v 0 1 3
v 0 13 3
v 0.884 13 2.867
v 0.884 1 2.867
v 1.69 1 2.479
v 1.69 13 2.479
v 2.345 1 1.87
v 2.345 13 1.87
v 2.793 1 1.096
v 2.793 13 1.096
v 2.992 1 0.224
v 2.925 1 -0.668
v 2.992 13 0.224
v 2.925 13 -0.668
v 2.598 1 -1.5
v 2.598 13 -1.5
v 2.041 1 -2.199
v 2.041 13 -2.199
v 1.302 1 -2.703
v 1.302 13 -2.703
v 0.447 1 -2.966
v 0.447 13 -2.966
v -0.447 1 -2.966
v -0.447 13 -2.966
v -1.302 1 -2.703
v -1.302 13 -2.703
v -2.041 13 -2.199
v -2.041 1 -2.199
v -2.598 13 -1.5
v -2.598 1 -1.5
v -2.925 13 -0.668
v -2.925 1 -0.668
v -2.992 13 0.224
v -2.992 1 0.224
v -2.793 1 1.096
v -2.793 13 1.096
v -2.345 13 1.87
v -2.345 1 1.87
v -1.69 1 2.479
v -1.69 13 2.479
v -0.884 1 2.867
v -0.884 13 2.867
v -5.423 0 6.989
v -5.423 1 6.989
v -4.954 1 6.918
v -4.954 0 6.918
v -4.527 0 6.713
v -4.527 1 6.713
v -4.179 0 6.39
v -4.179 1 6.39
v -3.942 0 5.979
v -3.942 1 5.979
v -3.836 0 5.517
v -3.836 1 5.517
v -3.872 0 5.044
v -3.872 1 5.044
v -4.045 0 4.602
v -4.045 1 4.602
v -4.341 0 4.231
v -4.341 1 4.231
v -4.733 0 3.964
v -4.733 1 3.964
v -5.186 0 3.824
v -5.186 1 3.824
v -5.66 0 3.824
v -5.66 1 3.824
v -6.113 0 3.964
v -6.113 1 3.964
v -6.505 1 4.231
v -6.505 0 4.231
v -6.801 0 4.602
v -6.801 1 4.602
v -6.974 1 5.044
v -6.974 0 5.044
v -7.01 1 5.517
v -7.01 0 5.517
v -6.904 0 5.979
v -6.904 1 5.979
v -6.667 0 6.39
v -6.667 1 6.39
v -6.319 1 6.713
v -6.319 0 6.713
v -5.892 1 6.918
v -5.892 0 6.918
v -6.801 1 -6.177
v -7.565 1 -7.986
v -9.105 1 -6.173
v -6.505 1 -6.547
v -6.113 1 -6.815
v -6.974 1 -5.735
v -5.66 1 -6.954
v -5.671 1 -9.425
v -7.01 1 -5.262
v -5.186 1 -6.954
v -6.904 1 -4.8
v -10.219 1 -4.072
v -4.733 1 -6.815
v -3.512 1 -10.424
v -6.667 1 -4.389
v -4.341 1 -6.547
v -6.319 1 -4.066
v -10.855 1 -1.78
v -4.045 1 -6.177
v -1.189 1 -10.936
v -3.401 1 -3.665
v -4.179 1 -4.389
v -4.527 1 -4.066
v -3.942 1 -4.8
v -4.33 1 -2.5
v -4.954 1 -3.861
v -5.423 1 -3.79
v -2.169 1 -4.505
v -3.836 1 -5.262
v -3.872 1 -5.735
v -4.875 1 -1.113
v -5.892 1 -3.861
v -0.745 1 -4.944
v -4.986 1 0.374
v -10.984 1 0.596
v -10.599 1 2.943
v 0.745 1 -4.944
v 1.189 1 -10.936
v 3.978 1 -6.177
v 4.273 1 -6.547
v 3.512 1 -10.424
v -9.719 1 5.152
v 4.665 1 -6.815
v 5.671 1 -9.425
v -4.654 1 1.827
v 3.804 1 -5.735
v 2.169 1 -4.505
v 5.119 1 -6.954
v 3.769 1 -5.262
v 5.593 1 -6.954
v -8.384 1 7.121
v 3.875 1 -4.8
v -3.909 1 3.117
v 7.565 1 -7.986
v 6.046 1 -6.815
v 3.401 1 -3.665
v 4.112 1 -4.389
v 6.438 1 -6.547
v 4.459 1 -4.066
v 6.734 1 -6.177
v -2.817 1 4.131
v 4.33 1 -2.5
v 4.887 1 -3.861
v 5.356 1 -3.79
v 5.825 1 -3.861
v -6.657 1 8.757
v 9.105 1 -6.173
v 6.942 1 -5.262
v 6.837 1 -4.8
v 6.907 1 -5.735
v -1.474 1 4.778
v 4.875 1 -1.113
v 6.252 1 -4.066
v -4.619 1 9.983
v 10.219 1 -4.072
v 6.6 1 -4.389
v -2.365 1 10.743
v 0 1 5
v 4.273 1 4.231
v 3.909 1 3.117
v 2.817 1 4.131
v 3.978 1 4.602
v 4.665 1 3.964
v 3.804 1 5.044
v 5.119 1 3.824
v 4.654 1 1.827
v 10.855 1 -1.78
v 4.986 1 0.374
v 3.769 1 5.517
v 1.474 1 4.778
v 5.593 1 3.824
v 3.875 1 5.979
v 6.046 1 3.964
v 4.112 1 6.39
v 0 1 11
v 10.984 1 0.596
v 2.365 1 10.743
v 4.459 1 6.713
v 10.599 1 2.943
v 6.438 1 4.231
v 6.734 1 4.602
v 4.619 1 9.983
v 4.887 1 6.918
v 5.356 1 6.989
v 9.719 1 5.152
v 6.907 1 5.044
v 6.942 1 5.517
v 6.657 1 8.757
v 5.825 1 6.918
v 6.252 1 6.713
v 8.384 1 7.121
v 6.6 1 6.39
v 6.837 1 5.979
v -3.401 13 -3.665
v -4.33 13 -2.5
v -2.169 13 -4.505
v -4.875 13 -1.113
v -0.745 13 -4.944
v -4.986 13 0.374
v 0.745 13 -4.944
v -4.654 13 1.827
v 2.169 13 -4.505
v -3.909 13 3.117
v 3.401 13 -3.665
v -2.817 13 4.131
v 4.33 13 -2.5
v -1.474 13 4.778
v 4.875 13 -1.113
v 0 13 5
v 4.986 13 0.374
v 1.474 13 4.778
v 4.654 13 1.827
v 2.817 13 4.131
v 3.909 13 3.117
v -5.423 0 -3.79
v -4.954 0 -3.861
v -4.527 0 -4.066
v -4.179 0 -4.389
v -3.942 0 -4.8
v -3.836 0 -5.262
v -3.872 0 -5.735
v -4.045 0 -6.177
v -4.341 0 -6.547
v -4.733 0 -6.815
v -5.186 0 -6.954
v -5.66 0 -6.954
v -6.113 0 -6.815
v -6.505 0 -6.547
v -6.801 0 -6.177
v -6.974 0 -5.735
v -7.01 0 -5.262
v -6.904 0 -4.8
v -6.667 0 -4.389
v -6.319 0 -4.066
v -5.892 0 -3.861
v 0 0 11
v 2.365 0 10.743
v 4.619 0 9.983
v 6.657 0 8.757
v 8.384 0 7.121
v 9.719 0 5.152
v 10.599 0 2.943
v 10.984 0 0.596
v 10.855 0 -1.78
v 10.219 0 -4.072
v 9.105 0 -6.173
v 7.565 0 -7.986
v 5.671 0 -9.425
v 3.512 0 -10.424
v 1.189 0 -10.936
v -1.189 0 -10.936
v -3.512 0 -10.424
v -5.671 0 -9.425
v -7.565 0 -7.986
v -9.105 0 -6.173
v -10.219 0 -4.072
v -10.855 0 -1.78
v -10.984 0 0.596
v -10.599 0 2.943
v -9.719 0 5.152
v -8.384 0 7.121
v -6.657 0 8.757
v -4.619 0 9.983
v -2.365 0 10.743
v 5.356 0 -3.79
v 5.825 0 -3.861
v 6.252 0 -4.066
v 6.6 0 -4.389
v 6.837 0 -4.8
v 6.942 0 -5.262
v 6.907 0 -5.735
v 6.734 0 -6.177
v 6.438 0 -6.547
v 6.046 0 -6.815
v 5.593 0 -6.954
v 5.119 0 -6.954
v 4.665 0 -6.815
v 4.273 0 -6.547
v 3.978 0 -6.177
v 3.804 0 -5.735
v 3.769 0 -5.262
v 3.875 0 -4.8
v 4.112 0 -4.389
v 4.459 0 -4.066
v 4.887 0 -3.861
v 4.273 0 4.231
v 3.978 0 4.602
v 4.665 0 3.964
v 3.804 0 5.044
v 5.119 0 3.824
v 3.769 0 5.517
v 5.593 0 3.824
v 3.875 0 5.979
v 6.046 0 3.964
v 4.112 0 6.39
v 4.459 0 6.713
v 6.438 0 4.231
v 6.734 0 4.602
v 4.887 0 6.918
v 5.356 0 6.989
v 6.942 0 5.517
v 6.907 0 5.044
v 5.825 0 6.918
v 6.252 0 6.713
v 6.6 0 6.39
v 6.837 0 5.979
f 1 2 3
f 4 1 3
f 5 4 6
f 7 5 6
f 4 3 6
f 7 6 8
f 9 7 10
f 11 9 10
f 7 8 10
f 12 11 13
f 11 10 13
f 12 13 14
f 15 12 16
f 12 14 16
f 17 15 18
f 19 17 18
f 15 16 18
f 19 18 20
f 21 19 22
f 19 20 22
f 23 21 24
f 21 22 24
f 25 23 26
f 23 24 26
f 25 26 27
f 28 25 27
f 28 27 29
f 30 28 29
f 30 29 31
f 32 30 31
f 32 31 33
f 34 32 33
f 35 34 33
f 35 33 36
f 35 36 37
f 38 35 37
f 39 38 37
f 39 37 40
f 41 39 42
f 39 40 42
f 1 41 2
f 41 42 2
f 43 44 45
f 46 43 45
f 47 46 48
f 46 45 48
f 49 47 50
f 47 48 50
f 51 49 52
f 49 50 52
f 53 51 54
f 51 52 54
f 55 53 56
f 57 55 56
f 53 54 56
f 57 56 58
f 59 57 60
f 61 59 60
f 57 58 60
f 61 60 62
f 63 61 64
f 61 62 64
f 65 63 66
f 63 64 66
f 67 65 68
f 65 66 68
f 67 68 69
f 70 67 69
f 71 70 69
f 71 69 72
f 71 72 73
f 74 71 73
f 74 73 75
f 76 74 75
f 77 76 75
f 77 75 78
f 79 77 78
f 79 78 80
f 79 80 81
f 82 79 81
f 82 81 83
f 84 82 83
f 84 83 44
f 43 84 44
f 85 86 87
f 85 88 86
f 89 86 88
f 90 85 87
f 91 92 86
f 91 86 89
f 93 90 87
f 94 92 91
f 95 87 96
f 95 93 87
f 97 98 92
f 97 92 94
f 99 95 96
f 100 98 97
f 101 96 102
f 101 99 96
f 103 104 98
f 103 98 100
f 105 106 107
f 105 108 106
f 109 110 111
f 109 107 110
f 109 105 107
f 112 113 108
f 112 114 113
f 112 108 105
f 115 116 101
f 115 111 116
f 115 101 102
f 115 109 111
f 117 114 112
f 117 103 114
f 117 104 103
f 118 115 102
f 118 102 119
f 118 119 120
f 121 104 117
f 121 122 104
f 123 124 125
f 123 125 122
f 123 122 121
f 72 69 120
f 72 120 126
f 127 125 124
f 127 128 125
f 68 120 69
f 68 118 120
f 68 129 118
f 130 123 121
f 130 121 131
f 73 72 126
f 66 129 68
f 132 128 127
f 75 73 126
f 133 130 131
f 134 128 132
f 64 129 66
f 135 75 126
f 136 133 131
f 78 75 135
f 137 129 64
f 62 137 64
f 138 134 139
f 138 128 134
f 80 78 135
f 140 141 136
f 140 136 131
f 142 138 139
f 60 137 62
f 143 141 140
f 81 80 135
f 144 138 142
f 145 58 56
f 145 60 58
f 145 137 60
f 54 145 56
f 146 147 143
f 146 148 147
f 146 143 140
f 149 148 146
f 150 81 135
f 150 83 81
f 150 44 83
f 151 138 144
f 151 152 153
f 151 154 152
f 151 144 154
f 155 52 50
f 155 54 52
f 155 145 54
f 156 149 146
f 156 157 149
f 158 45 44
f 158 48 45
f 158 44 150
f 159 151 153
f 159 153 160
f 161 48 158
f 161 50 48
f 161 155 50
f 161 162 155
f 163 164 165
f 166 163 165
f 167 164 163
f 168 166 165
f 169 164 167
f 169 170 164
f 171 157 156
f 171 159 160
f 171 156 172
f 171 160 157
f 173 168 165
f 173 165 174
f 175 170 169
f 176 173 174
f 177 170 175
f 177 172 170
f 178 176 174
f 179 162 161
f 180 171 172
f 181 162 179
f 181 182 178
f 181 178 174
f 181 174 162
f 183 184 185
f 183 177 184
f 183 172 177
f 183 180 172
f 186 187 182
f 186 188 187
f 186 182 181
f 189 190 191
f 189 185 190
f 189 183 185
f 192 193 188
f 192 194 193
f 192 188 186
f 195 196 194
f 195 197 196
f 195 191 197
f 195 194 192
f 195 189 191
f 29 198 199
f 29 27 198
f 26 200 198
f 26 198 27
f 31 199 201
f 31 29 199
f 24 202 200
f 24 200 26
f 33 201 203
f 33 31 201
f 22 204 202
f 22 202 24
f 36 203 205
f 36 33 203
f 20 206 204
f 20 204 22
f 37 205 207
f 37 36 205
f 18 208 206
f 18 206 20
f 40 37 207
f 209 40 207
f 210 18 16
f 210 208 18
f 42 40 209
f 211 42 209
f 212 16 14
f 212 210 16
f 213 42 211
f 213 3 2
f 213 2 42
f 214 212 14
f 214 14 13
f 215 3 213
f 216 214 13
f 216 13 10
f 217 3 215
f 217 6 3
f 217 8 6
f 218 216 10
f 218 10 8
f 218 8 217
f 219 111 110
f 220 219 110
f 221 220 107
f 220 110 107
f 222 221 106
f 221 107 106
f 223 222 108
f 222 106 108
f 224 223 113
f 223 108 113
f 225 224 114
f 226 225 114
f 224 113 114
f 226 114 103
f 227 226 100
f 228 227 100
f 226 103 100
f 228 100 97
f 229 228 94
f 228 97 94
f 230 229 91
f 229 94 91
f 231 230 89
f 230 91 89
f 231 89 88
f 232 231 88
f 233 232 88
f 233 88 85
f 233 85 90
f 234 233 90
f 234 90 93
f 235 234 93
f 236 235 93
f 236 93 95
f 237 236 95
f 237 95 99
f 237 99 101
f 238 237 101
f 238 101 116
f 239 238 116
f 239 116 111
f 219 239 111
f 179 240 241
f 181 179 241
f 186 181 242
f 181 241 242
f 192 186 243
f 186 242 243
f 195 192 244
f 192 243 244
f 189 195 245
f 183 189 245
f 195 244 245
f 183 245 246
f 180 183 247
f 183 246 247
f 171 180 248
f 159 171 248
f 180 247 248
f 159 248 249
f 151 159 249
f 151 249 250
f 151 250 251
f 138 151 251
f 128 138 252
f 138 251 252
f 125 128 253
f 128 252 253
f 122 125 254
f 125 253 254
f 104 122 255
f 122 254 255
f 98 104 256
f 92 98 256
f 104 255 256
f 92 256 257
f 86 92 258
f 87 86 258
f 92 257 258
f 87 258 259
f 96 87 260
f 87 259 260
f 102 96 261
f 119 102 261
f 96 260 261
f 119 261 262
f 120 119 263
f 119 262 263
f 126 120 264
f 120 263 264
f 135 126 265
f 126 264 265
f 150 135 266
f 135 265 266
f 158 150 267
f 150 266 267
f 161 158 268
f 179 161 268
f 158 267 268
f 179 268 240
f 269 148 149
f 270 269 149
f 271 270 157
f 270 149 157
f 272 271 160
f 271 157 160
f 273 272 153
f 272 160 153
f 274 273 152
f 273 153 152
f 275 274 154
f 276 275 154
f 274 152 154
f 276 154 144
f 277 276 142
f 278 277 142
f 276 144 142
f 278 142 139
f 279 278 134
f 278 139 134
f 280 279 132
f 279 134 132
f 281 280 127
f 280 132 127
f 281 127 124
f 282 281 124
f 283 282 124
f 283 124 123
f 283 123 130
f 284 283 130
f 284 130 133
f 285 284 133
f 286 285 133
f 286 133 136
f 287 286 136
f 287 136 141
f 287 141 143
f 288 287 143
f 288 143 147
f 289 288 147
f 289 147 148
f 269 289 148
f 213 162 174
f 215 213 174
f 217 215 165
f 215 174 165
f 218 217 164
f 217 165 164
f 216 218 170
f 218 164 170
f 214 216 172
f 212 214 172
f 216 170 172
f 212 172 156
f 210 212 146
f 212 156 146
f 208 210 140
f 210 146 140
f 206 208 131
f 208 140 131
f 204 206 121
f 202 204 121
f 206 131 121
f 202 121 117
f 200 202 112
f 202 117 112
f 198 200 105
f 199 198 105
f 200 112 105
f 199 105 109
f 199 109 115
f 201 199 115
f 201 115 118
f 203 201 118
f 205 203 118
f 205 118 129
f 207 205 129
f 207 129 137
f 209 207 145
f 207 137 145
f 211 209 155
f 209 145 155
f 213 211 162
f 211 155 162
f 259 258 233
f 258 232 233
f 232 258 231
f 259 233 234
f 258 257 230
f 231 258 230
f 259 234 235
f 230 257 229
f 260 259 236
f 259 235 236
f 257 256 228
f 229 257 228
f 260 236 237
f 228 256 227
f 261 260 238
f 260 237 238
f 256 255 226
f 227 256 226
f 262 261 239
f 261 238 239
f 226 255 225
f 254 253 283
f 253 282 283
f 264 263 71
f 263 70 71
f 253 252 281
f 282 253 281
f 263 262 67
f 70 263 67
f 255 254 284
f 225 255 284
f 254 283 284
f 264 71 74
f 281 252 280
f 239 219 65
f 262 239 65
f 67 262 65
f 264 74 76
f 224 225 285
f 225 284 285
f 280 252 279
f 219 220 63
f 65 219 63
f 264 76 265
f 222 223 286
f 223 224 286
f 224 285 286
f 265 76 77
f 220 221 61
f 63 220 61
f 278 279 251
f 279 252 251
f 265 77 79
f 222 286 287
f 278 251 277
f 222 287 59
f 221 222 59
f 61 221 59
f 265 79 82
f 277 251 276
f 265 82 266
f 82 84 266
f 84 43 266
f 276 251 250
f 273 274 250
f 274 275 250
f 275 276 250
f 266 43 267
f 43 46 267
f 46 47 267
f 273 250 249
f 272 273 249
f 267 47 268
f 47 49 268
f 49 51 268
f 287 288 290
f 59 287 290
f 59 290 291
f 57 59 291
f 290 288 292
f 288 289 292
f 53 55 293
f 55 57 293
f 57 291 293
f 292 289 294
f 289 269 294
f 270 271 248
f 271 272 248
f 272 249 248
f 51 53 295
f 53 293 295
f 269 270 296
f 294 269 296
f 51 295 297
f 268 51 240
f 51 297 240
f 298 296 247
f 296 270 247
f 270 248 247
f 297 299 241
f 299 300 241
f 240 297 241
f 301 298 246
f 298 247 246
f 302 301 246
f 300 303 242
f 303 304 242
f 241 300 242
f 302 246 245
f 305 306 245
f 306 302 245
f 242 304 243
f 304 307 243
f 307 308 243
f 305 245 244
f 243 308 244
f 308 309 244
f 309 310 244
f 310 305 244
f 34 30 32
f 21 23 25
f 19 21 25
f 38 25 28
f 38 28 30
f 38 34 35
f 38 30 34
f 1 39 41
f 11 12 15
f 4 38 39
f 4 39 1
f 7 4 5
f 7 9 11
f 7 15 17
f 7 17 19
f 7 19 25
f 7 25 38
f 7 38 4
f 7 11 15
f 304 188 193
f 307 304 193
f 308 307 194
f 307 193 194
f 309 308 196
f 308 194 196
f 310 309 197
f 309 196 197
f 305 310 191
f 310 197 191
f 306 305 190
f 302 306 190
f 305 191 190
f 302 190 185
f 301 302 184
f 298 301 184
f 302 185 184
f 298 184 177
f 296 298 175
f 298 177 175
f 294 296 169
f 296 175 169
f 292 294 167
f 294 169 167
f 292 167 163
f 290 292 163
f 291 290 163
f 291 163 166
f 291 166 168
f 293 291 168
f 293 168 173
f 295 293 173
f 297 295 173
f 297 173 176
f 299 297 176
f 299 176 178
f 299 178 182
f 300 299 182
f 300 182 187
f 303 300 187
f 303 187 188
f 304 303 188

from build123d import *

# Parameters (mm, degrees)
SKETCH1_R           = 11
BOSS_EXTRUDE1_DEPTH = 1
SKETCH2_R           = 5
BOSS_EXTRUDE2_DEPTH = 12
SKETCH3_R           = 3
CUT_EXTRUDE1_DEPTH  = 12
CUT_EXTRUDE2_REACH  = 21.647
SKETCH4_R           = 1.591156764


with BuildPart() as part:
    # Sketch1 → Boss-Extrude1 (new body)
    with BuildSketch(Plane(origin=(0, 0, 0), x_dir=(1, 0, 0), z_dir=(0, 1, 0))):
        Circle(SKETCH1_R)
    extrude(amount=BOSS_EXTRUDE1_DEPTH)

    # Sketch2 → Boss-Extrude2 (add)
    with BuildSketch(Plane(origin=(0, 1, 0), x_dir=(1, 0, 0), z_dir=(0, 1, 0))):
        Circle(SKETCH2_R)
    extrude(amount=BOSS_EXTRUDE2_DEPTH)

    # Sketch3 → Cut-Extrude1 (cut)
    with BuildSketch(Plane(origin=(0, 13, 0), x_dir=(1, 0, 0), z_dir=(0, 1, 0))):
        Circle(SKETCH3_R)
    extrude(amount=-CUT_EXTRUDE1_DEPTH, mode=Mode.SUBTRACT)

    # Sketch4 → Cut-Extrude2 (cut, up to next)
    with BuildSketch(Plane(origin=(0, 1, 0), x_dir=(1, 0, 0), z_dir=(0, 1, 0)), mode=Mode.PRIVATE) as cut_extrude2_sk1:
        with Locations((5.355689552, 5.380973844)):
            Circle(SKETCH4_R)
    cut_extrude2_tool1 = extrude(cut_extrude2_sk1.sketch, amount=-CUT_EXTRUDE2_REACH, mode=Mode.PRIVATE) & part.part
    # Sketch4 → Cut-Extrude2 (cut, up to next)
    with BuildSketch(Plane(origin=(0, 1, 0), x_dir=(1, 0, 0), z_dir=(0, 1, 0)), mode=Mode.PRIVATE) as cut_extrude2_sk2:
        with Locations((-5.42311433, 5.380973844)):
            Circle(SKETCH4_R)
    cut_extrude2_tool2 = extrude(cut_extrude2_sk2.sketch, amount=-CUT_EXTRUDE2_REACH, mode=Mode.PRIVATE) & part.part
    # Sketch4 → Cut-Extrude2 (cut, up to next)
    with BuildSketch(Plane(origin=(0, 1, 0), x_dir=(1, 0, 0), z_dir=(0, 1, 0)), mode=Mode.PRIVATE) as cut_extrude2_sk3:
        with Locations((-5.42311433, -5.397830038)):
            Circle(SKETCH4_R)
    cut_extrude2_tool3 = extrude(cut_extrude2_sk3.sketch, amount=-CUT_EXTRUDE2_REACH, mode=Mode.PRIVATE) & part.part
    # Sketch4 → Cut-Extrude2 (cut, up to next)
    with BuildSketch(Plane(origin=(0, 1, 0), x_dir=(1, 0, 0), z_dir=(0, 1, 0)), mode=Mode.PRIVATE) as cut_extrude2_sk4:
        with Locations((5.355689552, -5.397830038)):
            Circle(SKETCH4_R)
    cut_extrude2_tool4 = extrude(cut_extrude2_sk4.sketch, amount=-CUT_EXTRUDE2_REACH, mode=Mode.PRIVATE) & part.part
    add(cut_extrude2_tool1.solids().sort_by_distance((5.35569, 1, -5.380974))[0], mode=Mode.SUBTRACT)
    add(cut_extrude2_tool2.solids().sort_by_distance((-5.423114, 1, -5.380974))[0], mode=Mode.SUBTRACT)
    add(cut_extrude2_tool3.solids().sort_by_distance((-5.423114, 1, 5.39783))[0], mode=Mode.SUBTRACT)
    add(cut_extrude2_tool4.solids().sort_by_distance((5.35569, 1, 5.39783))[0], mode=Mode.SUBTRACT)


solid = part.part
